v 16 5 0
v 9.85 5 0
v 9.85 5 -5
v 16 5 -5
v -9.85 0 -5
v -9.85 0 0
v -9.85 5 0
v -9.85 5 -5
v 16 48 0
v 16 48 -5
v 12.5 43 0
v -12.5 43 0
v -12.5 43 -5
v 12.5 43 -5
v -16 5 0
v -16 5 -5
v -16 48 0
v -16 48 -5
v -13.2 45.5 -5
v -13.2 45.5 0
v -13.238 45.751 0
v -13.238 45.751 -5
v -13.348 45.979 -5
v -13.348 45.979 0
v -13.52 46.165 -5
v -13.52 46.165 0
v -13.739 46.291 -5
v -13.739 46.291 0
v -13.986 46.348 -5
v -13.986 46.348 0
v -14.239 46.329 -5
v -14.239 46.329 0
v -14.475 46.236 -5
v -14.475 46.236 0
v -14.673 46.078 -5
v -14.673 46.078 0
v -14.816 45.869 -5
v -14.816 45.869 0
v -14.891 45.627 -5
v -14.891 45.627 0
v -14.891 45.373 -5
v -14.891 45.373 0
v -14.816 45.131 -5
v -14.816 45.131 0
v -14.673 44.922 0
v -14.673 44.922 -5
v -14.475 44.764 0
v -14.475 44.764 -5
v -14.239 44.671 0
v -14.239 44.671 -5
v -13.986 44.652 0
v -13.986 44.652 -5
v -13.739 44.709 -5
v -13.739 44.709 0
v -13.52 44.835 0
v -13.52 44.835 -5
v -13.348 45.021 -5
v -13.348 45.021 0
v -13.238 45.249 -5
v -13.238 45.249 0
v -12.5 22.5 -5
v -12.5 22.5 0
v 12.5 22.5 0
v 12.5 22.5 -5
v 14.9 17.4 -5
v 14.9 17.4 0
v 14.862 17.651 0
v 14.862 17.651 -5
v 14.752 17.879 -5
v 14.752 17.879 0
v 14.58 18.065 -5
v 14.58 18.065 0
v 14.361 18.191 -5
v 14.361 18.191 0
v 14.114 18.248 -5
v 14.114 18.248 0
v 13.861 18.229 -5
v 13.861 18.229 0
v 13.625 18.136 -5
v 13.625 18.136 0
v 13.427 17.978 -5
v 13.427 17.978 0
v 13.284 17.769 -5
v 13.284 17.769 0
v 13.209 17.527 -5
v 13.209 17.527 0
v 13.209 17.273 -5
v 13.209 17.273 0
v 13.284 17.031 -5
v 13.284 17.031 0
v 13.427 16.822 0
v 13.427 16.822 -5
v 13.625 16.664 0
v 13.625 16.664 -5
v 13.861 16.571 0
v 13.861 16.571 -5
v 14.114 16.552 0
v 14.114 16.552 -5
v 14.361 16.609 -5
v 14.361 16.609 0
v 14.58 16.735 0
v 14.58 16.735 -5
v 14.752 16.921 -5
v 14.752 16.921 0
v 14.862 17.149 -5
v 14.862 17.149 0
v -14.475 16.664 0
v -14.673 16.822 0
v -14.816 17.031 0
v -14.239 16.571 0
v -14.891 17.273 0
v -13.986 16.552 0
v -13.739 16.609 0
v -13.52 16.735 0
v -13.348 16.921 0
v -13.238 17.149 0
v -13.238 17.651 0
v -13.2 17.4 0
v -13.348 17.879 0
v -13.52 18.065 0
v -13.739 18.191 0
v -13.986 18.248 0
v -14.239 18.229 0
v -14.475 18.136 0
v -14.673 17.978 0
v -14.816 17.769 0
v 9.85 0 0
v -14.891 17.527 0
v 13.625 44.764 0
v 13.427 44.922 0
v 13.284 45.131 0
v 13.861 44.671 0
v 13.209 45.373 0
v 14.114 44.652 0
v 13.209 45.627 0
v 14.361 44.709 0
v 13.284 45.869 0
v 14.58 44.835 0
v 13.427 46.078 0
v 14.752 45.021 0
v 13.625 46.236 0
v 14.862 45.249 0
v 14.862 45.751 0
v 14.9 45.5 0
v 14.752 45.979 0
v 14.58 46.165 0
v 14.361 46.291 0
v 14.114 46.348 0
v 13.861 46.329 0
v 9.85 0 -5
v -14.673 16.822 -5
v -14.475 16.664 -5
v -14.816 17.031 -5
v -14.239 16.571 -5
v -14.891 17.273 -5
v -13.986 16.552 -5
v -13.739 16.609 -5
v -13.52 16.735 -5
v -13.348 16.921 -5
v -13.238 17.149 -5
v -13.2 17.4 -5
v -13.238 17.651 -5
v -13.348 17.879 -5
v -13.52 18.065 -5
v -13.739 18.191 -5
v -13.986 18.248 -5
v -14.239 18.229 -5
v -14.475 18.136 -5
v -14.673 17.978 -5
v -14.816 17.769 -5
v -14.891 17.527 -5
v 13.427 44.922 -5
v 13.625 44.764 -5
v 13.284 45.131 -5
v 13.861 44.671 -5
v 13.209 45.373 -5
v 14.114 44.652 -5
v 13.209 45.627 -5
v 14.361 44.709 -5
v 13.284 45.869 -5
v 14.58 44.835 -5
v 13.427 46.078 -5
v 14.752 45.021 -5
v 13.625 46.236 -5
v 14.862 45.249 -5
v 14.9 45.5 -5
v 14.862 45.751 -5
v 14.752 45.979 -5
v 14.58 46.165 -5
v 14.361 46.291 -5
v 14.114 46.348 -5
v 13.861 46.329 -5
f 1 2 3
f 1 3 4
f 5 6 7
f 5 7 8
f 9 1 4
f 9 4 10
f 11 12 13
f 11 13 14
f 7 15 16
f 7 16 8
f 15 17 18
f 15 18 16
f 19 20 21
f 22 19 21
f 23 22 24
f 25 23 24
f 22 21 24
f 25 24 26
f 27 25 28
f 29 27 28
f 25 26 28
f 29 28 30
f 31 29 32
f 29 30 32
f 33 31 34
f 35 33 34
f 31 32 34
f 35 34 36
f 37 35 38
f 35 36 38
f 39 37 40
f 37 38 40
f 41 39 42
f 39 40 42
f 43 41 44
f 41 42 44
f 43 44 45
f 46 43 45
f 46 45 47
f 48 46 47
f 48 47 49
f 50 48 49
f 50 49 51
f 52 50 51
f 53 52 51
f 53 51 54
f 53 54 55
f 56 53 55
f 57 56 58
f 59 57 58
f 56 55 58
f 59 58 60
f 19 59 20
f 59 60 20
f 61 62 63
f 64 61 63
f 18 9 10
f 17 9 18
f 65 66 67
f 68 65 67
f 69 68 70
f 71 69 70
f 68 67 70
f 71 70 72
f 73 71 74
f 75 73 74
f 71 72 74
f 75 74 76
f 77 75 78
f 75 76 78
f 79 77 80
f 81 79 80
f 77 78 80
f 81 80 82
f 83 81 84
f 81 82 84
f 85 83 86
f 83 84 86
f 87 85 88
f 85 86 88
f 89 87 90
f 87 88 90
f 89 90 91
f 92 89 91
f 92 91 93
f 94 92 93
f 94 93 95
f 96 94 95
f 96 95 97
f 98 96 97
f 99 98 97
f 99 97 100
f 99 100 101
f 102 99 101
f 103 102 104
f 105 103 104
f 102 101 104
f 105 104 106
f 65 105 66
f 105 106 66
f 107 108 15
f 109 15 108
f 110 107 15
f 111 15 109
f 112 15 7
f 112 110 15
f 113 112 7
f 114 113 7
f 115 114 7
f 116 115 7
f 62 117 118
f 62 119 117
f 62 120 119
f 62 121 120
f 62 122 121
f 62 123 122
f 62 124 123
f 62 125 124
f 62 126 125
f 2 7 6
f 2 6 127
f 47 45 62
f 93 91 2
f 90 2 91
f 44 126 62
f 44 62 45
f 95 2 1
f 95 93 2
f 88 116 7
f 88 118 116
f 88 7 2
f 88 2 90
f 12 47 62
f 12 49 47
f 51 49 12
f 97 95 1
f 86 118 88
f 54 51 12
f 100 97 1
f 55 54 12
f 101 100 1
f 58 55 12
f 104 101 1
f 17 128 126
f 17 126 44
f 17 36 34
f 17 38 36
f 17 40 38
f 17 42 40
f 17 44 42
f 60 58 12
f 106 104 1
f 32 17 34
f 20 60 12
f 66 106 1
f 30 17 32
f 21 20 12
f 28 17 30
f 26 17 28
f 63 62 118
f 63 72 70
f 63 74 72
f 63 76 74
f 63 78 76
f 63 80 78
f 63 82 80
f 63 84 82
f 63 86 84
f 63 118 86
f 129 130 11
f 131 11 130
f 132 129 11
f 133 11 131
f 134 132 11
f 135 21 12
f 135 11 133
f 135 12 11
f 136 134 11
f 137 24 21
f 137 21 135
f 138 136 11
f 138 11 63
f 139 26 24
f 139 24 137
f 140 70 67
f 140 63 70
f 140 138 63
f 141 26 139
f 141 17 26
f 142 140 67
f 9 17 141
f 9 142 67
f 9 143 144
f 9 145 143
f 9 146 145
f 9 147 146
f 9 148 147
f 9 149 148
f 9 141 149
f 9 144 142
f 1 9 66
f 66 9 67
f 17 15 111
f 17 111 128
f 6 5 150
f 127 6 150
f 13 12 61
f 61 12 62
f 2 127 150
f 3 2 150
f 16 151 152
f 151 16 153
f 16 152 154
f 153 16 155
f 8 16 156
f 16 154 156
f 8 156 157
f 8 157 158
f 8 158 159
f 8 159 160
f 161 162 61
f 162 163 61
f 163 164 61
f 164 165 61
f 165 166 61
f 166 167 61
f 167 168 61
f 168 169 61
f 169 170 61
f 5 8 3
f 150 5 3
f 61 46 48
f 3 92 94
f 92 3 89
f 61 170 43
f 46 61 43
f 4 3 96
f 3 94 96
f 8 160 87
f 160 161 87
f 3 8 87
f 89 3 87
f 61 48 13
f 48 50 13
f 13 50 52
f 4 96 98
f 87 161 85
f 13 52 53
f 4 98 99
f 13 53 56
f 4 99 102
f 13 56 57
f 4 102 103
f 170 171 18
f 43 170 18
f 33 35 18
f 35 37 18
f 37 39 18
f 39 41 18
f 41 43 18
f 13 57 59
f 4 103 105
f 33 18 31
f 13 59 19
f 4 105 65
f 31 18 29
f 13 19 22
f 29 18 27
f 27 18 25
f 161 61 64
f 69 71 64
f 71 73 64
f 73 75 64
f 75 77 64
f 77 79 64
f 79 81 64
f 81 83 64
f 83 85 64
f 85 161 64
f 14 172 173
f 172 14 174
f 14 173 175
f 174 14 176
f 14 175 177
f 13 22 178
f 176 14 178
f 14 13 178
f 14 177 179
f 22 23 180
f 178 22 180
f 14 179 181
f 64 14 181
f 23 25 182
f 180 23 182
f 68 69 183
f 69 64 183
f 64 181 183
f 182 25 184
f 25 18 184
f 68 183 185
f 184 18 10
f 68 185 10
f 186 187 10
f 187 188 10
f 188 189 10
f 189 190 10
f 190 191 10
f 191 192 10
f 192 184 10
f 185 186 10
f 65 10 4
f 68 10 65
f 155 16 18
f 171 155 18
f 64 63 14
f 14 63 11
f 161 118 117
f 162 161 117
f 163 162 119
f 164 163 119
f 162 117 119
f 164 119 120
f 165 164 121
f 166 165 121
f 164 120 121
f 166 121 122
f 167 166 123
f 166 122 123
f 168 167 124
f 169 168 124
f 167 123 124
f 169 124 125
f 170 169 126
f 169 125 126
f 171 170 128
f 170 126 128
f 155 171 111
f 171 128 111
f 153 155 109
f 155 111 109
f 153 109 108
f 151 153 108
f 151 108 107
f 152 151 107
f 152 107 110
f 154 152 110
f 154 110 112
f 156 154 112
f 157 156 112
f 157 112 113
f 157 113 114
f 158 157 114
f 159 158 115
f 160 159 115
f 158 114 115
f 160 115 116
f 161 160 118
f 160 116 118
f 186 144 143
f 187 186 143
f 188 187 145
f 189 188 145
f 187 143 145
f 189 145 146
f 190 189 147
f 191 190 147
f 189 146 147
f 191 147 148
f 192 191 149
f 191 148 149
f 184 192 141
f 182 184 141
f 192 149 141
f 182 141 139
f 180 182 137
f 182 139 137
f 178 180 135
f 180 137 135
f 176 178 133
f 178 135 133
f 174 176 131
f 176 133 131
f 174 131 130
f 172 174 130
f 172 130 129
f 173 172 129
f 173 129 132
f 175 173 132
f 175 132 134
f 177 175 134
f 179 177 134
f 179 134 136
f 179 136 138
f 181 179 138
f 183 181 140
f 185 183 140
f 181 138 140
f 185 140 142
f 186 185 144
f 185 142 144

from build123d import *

# Parameters (mm, degrees)
SKETCH2_W           = 19.7
SKETCH2_H           = 5
BOSS_EXTRUDE1_DEPTH = 5
BOSS_EXTRUDE2_DEPTH = 5
SKETCH5_R           = 0.85
CUT_EXTRUDE1_DEPTH  = 5


with BuildPart() as part:
    # Sketch2 → Boss-Extrude1 (new body)
    with BuildSketch(Plane(origin=(0, 0, 0), x_dir=(1, 0, 0), z_dir=(0, 1, 0))):
        with Locations((0, 2.5)):
            Rectangle(SKETCH2_W, SKETCH2_H)
    extrude(amount=BOSS_EXTRUDE1_DEPTH)

    # Sketch4 → Boss-Extrude2 (add)
    with BuildSketch(Plane.XY):
        Polygon((-16, 5), (16, 5), (16, 48), (0, 48), (-16, 48), align=None)
        Polygon((-12.5, 22.5), (12.5, 22.5), (12.5, 43), (0, 43), (-12.5, 43), align=None, mode=Mode.SUBTRACT)
    extrude(amount=-BOSS_EXTRUDE2_DEPTH)

    # Sketch5 → Cut-Extrude1 (cut)
    with BuildSketch(Plane.XY):
        with Locations((-14.05, 45.5)):
            Circle(SKETCH5_R)
        with Locations((-14.05, 17.4)):
            Circle(SKETCH5_R)
        with Locations((14.05, 17.4)):
            Circle(SKETCH5_R)
        with Locations((14.05, 45.5)):
            Circle(SKETCH5_R)
    extrude(amount=-CUT_EXTRUDE1_DEPTH, mode=Mode.SUBTRACT)


solid = part.part
